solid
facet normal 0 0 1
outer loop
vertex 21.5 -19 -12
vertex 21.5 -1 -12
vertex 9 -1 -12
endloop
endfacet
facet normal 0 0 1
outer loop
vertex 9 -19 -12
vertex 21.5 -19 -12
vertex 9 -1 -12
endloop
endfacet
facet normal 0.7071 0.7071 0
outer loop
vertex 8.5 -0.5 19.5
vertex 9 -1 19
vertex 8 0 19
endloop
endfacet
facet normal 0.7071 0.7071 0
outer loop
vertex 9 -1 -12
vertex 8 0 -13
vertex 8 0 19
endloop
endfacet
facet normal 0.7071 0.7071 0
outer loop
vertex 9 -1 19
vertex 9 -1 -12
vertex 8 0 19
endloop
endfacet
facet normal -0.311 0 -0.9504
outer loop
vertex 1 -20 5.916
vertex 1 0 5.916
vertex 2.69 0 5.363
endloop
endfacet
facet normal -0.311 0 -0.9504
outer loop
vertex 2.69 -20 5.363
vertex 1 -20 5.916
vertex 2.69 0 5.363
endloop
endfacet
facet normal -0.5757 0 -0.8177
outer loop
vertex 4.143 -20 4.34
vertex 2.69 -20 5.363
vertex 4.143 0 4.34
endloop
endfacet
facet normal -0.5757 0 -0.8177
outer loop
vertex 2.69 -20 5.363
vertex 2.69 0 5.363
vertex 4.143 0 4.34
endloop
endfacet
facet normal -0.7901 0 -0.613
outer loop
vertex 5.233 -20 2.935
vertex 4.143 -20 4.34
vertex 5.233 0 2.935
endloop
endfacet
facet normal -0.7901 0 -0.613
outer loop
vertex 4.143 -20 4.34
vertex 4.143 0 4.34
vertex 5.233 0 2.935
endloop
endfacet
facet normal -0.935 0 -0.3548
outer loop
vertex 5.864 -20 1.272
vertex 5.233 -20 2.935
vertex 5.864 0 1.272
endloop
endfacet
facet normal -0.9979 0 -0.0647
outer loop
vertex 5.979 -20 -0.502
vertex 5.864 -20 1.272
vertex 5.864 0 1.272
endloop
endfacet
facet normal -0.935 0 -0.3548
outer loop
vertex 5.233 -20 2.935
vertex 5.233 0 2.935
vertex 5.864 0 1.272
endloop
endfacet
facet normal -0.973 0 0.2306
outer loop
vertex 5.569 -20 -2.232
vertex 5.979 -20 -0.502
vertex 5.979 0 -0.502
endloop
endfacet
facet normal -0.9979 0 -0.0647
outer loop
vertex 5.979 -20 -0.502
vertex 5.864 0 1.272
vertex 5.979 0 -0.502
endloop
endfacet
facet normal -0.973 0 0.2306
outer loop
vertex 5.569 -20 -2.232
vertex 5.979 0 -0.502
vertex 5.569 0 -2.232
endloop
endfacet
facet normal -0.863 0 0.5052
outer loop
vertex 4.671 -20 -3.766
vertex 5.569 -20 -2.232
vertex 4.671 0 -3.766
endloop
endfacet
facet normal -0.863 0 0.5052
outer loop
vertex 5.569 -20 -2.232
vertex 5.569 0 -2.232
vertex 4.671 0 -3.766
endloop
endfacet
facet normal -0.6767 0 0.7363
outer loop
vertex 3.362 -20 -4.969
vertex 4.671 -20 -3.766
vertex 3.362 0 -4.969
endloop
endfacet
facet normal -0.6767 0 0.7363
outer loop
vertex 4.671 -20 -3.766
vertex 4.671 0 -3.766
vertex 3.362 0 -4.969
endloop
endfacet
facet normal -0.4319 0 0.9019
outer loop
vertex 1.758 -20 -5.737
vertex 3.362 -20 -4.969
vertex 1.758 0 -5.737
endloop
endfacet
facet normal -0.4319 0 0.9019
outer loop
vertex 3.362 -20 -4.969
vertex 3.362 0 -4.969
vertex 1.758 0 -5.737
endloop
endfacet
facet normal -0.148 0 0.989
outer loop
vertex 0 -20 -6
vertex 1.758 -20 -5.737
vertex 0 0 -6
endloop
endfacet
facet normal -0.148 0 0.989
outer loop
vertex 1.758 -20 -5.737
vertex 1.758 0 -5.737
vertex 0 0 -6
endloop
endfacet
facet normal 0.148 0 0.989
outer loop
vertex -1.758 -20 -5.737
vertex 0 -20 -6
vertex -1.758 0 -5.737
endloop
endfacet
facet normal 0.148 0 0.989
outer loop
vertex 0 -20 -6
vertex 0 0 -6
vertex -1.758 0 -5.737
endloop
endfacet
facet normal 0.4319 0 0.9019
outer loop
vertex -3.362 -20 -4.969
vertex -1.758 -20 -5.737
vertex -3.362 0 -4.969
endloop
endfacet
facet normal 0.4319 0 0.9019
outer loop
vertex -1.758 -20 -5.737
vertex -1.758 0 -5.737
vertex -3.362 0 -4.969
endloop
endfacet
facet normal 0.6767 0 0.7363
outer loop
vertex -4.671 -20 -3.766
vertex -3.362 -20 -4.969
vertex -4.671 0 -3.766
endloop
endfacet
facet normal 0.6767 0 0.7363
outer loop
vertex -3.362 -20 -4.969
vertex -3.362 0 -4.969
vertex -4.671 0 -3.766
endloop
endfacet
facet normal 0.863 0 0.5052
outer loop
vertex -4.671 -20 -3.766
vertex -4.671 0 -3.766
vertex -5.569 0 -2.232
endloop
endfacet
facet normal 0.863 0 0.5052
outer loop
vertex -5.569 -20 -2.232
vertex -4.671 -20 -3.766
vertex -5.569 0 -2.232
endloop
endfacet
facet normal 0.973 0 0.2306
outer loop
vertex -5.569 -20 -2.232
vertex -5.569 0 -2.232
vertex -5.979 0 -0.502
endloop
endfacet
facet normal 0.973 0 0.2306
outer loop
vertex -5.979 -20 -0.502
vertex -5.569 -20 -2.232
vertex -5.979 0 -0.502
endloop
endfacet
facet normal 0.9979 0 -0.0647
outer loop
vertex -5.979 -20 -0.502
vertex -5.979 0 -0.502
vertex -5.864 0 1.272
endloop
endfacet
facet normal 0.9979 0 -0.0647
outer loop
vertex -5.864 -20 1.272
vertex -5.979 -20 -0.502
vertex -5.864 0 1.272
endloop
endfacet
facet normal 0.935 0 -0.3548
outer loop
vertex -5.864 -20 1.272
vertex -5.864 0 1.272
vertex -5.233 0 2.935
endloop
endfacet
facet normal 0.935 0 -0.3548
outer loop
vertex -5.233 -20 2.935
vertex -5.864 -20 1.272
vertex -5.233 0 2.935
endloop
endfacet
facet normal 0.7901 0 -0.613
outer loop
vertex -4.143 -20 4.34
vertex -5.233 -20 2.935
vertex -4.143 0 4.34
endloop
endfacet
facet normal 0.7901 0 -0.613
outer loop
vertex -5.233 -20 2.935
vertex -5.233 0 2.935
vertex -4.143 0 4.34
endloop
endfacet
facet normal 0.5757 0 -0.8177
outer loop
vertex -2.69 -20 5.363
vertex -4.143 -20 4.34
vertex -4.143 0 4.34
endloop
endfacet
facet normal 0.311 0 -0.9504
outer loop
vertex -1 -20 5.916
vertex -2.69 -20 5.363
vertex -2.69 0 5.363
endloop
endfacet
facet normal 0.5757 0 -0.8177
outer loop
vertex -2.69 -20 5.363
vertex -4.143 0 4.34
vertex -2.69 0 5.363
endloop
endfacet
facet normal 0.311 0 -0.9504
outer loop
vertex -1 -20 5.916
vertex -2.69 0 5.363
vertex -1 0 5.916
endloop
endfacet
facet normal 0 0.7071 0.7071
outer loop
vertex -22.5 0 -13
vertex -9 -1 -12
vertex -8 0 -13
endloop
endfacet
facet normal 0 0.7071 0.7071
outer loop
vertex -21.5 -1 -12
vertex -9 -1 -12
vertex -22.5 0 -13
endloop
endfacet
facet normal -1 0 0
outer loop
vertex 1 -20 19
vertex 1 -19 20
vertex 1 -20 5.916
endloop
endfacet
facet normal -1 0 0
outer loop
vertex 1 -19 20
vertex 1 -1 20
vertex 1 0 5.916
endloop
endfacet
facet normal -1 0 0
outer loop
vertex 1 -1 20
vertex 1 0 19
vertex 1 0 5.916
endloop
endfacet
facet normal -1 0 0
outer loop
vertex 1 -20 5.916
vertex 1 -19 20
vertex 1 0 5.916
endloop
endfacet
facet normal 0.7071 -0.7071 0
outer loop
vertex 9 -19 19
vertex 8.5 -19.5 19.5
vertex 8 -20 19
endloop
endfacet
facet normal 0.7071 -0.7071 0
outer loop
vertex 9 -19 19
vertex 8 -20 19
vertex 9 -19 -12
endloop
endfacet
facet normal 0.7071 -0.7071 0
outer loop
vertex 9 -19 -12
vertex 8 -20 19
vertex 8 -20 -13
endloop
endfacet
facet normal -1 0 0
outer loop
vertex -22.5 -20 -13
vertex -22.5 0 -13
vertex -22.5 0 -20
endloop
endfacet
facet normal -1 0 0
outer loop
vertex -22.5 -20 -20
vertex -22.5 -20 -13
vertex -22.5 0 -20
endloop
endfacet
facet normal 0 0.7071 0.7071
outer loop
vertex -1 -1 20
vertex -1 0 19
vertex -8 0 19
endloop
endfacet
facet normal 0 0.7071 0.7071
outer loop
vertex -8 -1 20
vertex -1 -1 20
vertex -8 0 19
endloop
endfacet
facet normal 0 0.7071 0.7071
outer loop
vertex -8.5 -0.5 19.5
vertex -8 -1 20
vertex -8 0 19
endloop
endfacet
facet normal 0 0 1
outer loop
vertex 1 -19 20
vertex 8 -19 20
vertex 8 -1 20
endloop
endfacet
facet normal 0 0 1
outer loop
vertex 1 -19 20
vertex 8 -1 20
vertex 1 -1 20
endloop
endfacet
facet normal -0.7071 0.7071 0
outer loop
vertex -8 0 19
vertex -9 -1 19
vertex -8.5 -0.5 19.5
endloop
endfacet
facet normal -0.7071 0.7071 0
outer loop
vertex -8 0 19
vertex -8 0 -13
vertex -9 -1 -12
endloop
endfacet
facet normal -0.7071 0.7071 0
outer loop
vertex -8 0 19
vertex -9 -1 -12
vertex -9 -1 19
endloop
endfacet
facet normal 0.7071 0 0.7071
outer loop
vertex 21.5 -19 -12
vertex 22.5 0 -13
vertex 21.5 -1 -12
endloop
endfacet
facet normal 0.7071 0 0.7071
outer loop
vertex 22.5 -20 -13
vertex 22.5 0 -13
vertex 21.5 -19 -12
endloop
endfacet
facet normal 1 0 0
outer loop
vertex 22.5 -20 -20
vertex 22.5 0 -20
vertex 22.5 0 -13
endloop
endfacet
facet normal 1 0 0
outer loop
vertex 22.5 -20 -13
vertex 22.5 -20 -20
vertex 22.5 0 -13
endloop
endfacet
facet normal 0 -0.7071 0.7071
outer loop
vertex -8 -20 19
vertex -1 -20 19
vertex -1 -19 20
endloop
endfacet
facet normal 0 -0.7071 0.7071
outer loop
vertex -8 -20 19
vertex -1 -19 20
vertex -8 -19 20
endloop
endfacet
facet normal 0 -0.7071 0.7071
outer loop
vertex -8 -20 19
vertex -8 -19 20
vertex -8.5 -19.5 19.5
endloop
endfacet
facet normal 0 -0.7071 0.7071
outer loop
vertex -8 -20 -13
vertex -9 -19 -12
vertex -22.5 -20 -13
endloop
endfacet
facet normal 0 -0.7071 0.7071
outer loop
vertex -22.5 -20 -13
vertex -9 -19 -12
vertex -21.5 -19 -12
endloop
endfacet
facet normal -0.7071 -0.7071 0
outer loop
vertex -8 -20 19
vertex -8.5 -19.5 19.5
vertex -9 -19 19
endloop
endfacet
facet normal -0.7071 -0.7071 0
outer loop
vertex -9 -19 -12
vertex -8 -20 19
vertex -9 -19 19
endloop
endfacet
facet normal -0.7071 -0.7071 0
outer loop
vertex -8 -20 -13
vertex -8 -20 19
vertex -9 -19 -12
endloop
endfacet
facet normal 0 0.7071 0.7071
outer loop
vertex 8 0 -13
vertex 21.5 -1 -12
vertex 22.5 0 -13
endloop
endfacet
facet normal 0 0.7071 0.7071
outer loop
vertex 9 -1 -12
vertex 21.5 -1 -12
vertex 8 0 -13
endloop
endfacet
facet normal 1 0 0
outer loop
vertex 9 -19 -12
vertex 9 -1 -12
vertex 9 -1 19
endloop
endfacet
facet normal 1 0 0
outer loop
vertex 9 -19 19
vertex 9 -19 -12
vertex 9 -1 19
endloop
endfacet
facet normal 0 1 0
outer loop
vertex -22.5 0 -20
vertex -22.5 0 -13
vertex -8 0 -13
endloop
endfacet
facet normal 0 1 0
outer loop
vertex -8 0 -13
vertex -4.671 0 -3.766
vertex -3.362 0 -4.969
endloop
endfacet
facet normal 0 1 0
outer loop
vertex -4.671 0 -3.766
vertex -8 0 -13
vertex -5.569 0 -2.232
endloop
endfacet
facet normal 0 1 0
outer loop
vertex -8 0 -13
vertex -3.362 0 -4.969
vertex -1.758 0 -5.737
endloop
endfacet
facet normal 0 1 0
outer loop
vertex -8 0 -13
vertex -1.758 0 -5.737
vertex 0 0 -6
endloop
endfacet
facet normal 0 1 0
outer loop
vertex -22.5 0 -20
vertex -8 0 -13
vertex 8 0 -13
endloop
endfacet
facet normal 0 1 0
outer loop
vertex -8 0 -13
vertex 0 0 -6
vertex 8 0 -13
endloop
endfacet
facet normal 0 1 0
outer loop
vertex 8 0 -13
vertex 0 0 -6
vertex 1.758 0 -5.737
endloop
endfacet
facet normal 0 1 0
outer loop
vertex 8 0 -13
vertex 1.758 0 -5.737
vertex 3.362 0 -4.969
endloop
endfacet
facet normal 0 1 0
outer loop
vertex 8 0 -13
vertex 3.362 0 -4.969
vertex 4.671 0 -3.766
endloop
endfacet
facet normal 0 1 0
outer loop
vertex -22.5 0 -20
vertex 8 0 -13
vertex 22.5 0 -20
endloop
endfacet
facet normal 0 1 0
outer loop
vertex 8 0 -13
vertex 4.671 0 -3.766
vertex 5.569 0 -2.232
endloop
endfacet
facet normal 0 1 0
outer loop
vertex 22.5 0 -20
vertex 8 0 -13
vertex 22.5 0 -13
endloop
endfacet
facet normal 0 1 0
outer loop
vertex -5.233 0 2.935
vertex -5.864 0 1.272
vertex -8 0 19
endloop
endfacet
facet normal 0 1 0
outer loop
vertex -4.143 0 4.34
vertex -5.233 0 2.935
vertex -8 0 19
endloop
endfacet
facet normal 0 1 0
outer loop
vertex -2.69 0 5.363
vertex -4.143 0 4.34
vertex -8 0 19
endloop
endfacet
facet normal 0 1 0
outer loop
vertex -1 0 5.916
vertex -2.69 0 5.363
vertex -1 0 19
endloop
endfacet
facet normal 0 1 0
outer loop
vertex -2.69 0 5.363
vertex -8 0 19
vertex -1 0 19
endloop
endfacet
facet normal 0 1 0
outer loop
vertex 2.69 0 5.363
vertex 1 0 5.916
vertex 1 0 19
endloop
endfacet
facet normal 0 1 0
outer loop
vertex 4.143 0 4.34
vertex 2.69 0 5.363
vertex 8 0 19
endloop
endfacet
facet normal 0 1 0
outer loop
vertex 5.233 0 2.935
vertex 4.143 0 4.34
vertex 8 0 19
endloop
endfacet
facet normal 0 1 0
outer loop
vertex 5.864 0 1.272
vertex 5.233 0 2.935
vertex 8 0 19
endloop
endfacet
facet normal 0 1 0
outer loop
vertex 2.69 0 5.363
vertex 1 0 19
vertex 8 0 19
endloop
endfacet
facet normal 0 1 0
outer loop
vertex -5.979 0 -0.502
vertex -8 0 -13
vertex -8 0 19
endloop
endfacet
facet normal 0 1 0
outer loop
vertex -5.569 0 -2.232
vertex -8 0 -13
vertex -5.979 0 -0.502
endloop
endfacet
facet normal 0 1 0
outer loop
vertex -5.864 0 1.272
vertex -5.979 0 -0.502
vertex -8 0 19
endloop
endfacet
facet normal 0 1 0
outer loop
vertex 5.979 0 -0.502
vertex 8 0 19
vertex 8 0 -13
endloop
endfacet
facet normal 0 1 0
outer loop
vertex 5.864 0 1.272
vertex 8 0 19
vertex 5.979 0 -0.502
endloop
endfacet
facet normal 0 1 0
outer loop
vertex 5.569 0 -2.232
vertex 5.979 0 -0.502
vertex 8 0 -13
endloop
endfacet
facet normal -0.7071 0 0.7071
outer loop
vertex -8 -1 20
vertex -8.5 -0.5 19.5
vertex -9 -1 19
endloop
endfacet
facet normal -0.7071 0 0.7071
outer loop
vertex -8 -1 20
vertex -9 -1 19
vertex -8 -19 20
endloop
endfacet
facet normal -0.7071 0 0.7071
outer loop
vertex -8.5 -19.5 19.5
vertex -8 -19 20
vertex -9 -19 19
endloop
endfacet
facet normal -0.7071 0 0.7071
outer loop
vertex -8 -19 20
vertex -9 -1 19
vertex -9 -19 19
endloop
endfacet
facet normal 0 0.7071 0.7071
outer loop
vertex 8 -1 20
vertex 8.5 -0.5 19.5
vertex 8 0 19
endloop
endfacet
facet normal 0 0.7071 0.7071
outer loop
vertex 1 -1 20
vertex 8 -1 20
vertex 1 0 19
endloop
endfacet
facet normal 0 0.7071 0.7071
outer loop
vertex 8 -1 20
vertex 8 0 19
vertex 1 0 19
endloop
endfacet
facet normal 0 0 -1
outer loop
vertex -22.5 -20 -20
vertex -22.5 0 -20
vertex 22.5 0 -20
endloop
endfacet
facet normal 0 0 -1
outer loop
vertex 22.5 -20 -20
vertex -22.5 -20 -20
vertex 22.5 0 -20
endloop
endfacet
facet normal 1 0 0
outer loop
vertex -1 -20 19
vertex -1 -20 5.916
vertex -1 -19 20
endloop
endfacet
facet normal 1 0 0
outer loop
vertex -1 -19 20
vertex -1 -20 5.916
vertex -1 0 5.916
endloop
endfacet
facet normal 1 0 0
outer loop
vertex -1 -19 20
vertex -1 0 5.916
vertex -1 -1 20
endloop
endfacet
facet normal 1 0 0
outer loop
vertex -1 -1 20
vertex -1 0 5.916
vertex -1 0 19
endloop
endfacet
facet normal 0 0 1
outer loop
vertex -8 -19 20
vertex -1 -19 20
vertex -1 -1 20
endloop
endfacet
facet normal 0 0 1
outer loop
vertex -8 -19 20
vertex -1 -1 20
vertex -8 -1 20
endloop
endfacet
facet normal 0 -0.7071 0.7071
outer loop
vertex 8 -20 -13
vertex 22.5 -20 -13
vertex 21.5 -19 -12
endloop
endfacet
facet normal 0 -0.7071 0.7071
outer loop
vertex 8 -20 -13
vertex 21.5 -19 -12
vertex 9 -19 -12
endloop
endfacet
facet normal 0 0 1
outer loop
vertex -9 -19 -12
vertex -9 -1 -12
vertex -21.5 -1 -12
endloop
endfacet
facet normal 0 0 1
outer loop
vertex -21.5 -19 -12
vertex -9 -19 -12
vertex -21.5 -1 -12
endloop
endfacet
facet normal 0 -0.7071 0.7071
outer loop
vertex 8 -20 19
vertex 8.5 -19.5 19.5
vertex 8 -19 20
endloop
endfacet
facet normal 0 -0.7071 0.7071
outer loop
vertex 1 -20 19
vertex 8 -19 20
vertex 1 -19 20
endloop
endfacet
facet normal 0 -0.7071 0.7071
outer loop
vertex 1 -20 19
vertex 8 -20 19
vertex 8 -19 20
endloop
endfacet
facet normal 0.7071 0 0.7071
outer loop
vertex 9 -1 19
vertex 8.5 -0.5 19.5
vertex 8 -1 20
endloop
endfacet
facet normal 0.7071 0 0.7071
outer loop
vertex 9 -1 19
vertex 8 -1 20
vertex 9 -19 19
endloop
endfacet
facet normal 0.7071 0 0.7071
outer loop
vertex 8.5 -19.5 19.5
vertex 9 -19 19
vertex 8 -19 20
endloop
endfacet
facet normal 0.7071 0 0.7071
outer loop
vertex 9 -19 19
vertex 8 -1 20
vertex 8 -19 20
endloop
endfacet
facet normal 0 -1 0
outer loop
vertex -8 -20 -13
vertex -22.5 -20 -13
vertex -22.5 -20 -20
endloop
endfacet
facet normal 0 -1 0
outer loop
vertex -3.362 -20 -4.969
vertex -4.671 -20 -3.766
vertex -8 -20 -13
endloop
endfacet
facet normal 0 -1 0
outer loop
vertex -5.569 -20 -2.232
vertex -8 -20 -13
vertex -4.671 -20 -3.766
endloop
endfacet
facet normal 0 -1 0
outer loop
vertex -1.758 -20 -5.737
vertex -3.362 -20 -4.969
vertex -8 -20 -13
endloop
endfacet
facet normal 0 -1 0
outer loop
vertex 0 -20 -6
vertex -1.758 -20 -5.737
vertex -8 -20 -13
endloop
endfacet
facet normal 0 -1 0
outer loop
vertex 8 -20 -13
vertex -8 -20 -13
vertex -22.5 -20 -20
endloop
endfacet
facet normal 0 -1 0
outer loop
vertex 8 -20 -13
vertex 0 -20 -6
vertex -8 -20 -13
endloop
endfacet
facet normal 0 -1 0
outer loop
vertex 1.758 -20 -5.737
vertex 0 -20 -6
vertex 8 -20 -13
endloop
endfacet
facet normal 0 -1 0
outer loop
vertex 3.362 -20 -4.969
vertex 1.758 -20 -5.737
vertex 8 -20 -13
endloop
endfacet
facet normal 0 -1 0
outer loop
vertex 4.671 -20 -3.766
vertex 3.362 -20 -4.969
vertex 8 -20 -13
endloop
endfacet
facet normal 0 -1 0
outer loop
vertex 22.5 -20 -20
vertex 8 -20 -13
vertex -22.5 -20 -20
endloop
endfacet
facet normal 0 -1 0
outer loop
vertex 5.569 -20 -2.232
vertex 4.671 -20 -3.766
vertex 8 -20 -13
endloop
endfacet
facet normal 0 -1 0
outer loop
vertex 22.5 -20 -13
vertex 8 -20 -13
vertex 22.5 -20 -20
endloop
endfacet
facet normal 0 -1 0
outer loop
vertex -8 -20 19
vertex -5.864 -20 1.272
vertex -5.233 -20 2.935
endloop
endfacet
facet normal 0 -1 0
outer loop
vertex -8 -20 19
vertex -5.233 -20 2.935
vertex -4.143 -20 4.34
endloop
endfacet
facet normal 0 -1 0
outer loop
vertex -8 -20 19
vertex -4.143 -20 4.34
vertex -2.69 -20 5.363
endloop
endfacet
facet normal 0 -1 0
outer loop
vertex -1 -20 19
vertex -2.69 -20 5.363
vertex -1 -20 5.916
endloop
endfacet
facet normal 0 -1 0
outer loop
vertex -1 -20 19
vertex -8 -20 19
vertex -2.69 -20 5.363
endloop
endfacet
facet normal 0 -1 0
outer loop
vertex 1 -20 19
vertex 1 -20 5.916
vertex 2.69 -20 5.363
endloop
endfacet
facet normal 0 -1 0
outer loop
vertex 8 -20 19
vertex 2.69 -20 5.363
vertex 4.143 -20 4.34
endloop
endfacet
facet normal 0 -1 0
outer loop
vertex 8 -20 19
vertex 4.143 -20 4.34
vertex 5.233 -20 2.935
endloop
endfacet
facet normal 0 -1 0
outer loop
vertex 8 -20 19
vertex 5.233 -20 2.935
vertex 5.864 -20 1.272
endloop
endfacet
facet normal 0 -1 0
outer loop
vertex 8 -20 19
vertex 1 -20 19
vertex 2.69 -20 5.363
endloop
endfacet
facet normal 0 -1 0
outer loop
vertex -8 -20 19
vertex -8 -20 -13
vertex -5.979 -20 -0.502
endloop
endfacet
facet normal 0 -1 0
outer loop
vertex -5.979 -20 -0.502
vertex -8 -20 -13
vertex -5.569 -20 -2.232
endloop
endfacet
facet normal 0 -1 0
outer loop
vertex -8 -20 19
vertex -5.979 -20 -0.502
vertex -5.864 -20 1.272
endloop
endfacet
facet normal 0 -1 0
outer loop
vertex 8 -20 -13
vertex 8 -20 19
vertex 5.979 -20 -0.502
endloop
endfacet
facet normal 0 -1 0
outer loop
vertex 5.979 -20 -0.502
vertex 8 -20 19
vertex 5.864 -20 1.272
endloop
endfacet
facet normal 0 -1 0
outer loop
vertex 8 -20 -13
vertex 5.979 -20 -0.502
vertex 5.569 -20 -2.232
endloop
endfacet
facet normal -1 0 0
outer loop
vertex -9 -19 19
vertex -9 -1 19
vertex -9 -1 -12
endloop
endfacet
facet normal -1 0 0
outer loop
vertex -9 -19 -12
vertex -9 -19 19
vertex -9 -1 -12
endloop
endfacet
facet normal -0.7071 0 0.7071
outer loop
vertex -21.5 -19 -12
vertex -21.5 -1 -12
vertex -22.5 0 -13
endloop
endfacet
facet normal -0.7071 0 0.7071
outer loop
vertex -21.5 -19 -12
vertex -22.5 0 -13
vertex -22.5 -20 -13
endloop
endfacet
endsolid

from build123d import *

# Parameters (mm, degrees)
F1_DEPTH = 20
F2_SIZE  = 1
F3_SIZE  = 1
F4_SIZE  = 1


with BuildPart() as f1:
    # F0 (on Front) → F1 (new body)
    with BuildSketch(Plane.XZ):
        with BuildLine():
            Line((-9, -12), (-22.5, -12))
            Line((-22.5, -12), (-22.5, -20))
            Line((-22.5, -20), (22.5, -20))
            Line((22.5, -20), (22.5, -12))
            Line((22.5, -12), (9, -12))
            Line((9, -12), (9, 20))
            Line((9, 20), (1, 20))
            Line((1, 20), (1, 5.91608))
            ThreePointArc((1, 5.91608), (0, -6), (-1, 5.91608))
            Line((-1, 5.91608), (-1, 20))
            Line((-1, 20), (-9, 20))
            Line((-9, 20), (-9, -12))
        make_face()
    extrude(amount=F1_DEPTH)

    # F2
    f2_edges = [f1.edges().sort_by_distance(p)[0] for p in [
        (-5, -20, 20),
        (-5, 0, 20),
        (5, 0, 20),
        (5, -20, 20),
        (9, -10, 20),
        (-9, -10, 20),
    ]]
    chamfer(f2_edges, length=F2_SIZE)

    # F3
    f3_edges = [f1.edges().sort_by_distance(p)[0] for p in [
        (15.75, 0, -12),
        (15.75, -20, -12),
        (22.5, -10, -12),
        (-15.75, -20, -12),
        (-22.5, -10, -12),
        (-15.75, 0, -12),
    ]]
    chamfer(f3_edges, length=F3_SIZE)

    # F4
    f4_edges = [f1.edges().sort_by_distance(p)[0] for p in [
        (9, 0, 3.5),
        (-9, 0, 3.5),
        (9, -20, 3.5),
        (-9, -20, 3.5),
    ]]
    chamfer(f4_edges, length=F4_SIZE)


solid = f1.part
